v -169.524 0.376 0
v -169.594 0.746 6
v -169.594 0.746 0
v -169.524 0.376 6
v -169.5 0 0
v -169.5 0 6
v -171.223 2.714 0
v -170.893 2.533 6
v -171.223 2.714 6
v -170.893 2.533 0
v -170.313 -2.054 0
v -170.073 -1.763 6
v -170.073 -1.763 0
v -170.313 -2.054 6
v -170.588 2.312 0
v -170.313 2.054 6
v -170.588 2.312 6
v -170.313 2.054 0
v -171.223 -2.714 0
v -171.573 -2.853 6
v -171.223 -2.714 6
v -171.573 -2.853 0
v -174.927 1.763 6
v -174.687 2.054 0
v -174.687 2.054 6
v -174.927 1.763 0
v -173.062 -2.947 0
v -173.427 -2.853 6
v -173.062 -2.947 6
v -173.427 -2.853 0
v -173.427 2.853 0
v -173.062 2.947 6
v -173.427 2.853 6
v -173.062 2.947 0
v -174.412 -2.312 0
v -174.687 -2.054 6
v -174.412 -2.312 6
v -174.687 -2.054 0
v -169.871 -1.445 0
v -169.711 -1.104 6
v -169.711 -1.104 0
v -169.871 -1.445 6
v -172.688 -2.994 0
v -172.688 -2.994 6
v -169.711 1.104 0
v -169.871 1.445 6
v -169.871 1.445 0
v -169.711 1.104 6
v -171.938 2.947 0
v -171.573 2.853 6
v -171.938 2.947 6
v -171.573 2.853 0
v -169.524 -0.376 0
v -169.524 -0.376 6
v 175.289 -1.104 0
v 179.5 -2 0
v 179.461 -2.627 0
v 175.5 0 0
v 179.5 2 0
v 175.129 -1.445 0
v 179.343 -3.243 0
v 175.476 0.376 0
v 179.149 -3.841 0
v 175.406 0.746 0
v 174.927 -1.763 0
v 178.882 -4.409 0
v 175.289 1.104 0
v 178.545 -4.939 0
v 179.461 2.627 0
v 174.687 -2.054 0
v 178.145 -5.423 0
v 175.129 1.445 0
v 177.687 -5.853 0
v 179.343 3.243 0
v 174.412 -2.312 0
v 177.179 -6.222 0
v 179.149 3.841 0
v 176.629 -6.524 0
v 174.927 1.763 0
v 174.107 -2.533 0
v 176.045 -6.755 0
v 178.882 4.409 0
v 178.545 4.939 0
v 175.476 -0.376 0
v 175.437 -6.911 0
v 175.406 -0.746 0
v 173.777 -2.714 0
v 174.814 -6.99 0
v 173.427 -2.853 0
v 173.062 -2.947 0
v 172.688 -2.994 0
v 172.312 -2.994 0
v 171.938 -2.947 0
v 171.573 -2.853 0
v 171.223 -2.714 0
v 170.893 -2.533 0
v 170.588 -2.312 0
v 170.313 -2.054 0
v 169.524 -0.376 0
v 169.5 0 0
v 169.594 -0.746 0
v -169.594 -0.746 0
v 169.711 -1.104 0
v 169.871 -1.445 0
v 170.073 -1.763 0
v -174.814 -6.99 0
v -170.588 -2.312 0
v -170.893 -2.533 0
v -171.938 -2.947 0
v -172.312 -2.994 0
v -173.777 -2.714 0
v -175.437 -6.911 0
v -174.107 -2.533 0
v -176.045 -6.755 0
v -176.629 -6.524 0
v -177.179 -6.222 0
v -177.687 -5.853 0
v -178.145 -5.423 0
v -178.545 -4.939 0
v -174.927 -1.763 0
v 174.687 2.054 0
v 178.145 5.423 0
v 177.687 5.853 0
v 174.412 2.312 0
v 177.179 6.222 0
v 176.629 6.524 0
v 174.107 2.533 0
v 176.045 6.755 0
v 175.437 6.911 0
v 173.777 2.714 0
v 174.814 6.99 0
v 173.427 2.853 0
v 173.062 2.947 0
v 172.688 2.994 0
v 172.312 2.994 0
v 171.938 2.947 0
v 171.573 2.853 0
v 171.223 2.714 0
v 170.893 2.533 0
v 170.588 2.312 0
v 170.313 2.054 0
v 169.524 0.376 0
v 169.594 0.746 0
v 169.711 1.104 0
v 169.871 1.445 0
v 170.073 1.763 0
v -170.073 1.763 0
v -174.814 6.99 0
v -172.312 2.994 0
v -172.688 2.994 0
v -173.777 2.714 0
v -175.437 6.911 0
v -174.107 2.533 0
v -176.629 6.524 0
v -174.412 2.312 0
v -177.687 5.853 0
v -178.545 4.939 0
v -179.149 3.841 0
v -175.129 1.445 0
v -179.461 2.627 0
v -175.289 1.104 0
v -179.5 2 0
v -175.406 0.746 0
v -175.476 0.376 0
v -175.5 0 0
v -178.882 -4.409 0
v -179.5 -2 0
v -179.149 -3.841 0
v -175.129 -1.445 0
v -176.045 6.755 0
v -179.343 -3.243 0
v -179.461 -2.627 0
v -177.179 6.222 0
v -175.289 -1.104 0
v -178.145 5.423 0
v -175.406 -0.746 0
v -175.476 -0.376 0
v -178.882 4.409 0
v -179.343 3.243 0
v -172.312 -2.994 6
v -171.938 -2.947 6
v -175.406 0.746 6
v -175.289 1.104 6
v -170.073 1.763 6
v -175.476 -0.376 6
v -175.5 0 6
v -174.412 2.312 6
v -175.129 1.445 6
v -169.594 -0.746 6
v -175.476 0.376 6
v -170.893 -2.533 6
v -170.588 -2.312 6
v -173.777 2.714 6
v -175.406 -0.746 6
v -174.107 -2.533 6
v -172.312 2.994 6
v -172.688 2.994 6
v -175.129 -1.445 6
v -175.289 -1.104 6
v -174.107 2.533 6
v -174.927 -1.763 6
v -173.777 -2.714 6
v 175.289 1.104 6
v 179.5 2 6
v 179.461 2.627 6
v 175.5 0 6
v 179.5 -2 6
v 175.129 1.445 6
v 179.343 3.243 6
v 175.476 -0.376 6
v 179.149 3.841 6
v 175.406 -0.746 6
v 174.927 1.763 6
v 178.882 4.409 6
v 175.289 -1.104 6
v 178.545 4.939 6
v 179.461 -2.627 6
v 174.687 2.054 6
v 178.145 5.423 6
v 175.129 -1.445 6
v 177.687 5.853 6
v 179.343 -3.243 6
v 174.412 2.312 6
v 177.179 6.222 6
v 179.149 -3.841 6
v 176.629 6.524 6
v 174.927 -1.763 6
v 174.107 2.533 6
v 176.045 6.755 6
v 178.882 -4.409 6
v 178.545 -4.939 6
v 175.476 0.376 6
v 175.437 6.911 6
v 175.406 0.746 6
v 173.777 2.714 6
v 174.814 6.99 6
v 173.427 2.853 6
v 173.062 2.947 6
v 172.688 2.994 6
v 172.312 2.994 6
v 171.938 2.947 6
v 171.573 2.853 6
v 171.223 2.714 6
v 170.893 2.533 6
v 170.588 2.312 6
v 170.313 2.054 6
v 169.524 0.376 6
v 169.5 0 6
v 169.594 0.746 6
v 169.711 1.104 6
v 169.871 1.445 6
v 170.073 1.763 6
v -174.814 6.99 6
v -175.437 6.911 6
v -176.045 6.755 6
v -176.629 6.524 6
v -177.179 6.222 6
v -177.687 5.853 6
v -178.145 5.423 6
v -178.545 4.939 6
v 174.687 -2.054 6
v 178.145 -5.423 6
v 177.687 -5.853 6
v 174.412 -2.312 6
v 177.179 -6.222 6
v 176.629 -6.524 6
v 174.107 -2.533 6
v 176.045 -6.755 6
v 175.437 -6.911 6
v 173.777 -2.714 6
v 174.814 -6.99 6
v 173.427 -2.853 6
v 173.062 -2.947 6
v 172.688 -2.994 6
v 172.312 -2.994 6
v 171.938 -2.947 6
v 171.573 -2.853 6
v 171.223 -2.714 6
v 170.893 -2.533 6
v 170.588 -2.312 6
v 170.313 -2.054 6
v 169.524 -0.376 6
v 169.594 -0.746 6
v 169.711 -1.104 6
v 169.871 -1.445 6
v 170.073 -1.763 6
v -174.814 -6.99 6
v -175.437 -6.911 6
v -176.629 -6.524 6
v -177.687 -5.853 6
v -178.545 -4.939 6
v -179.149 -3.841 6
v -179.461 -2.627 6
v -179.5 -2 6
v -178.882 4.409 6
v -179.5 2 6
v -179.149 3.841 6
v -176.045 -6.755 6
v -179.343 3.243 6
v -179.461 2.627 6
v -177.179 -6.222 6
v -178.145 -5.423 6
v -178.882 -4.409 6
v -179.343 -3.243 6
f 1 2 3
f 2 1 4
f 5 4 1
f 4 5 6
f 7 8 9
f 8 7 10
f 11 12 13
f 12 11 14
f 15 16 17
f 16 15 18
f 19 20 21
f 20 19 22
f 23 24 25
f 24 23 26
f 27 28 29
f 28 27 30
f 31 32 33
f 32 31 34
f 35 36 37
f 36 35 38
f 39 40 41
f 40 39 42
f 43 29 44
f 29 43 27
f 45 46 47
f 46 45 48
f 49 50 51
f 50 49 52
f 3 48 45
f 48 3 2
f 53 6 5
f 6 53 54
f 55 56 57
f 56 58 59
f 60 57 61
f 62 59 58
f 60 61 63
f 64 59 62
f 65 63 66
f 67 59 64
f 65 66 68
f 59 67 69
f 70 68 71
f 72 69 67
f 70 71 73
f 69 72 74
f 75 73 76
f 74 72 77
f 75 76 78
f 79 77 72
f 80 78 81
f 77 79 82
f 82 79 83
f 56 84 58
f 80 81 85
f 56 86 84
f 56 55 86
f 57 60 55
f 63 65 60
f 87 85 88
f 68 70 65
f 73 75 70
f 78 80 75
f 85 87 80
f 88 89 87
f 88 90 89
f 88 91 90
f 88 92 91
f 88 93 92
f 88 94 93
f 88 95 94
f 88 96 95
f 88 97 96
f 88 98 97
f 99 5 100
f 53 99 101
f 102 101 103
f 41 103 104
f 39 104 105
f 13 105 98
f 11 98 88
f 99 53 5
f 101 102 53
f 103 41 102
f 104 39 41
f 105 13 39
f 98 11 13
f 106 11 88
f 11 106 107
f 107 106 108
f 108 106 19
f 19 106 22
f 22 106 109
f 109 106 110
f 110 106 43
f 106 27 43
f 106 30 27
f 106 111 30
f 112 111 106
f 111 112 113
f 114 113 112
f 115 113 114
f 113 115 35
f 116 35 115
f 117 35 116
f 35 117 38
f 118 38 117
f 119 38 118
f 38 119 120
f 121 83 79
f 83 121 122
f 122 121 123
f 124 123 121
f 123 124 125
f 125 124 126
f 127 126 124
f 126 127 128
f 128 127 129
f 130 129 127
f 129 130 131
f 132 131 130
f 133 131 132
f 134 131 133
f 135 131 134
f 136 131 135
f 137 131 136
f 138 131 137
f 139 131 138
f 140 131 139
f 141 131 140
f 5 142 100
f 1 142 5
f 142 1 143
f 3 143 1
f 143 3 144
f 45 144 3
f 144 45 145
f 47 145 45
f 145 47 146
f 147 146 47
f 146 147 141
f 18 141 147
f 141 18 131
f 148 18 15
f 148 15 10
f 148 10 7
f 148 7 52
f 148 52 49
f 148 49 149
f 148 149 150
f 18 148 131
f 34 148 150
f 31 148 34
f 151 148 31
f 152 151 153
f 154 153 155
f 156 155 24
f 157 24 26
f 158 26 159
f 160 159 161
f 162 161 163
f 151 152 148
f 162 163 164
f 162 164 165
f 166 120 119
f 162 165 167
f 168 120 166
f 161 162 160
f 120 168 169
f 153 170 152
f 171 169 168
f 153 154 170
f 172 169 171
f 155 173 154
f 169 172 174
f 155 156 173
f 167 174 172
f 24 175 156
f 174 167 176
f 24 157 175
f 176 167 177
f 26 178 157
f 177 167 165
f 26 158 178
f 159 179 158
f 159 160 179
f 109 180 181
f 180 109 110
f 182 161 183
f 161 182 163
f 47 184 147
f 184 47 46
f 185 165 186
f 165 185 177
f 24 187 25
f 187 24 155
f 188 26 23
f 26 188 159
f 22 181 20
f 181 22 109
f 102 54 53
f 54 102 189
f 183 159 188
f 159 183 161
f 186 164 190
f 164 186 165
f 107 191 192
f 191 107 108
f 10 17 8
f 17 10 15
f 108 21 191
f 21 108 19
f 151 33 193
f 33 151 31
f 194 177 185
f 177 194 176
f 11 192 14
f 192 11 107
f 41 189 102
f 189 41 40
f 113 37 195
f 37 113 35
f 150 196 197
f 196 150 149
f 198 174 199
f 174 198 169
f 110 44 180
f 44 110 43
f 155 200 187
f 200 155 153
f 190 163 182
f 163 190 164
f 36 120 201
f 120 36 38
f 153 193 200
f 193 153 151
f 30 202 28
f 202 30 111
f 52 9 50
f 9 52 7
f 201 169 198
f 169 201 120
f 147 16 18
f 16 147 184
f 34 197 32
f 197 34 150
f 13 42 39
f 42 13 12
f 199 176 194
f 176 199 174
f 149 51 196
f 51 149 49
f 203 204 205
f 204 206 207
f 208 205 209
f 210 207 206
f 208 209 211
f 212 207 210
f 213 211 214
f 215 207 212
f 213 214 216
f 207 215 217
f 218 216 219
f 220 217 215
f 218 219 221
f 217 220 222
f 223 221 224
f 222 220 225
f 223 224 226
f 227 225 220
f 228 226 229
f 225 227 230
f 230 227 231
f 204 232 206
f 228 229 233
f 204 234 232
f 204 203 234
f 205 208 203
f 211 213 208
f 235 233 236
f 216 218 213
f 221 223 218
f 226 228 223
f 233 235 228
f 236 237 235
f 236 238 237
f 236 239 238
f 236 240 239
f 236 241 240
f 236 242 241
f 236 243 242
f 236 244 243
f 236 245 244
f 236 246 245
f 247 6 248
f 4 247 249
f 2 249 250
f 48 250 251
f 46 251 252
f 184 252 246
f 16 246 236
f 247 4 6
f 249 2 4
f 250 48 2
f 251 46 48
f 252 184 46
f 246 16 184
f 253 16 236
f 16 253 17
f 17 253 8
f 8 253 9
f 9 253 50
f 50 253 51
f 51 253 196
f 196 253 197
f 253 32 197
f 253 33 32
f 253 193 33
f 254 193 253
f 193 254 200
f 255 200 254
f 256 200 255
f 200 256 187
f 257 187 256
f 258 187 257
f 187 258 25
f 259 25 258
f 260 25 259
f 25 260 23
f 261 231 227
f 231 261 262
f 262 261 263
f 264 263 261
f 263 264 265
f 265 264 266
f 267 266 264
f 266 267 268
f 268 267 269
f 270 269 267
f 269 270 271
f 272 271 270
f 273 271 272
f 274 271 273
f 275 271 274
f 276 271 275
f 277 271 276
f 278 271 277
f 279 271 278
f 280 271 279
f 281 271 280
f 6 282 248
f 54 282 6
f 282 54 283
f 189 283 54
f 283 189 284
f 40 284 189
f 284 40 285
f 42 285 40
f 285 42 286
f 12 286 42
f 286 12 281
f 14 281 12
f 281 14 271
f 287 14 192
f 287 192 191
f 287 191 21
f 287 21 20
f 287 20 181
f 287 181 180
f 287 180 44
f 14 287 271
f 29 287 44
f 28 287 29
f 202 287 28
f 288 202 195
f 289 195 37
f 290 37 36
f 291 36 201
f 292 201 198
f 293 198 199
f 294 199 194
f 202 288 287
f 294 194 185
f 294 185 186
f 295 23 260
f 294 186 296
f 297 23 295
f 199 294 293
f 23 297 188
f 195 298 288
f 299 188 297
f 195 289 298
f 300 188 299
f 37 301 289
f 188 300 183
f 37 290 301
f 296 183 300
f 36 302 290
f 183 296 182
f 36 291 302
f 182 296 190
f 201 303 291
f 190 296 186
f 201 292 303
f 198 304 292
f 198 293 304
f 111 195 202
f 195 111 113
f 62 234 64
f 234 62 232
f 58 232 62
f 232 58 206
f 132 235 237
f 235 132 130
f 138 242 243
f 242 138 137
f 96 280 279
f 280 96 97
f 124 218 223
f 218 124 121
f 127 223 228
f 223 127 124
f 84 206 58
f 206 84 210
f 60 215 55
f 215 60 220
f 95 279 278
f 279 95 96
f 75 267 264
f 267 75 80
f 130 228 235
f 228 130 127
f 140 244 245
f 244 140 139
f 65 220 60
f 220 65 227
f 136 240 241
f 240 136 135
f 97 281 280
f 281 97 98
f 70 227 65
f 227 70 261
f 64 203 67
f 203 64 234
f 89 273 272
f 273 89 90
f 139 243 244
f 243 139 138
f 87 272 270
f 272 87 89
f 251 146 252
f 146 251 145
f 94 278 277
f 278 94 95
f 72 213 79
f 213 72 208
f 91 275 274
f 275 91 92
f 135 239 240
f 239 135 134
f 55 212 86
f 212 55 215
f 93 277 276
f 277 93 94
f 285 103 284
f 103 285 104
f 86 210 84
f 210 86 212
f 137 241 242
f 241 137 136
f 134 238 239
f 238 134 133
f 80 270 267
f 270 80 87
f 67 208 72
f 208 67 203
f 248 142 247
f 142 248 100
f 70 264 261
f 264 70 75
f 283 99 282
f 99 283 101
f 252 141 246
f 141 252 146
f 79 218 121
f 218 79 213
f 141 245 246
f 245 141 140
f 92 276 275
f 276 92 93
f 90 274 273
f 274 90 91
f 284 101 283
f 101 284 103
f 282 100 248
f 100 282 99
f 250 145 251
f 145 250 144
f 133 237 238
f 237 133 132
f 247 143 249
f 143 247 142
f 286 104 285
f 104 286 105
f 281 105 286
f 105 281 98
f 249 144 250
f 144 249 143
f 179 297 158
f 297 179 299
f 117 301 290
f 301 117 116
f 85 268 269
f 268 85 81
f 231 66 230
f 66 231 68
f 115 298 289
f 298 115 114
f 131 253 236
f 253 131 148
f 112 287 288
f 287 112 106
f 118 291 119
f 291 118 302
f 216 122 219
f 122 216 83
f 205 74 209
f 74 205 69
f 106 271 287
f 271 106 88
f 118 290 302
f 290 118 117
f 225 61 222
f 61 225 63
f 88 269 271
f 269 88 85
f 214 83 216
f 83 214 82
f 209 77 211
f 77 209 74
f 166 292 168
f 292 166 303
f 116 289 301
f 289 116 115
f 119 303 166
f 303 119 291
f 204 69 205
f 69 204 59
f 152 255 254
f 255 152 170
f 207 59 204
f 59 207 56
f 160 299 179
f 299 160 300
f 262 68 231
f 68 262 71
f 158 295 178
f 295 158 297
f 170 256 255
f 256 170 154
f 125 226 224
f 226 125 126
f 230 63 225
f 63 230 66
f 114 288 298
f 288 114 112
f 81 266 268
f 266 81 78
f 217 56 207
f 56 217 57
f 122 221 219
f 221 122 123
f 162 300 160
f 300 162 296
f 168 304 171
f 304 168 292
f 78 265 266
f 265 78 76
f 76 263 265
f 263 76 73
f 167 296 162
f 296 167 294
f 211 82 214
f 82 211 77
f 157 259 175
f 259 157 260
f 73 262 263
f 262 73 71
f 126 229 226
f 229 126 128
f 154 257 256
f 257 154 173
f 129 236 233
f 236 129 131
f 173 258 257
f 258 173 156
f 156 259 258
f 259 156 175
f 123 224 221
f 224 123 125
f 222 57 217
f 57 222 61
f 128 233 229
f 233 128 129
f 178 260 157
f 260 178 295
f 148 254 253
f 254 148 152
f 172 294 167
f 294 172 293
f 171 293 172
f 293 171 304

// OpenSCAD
$fn = 50;


difference() {
	union() {
		hull() {
			translate(v = [-174.5000000000, 2.0000000000, 0]) {
				cylinder(h = 6, r = 5);
			}
			translate(v = [174.5000000000, 2.0000000000, 0]) {
				cylinder(h = 6, r = 5);
			}
			translate(v = [-174.5000000000, -2.0000000000, 0]) {
				cylinder(h = 6, r = 5);
			}
			translate(v = [174.5000000000, -2.0000000000, 0]) {
				cylinder(h = 6, r = 5);
			}
		}
	}
	union() {
		translate(v = [-172.5000000000, 0.0000000000, 0]) {
			cylinder(h = 6, r = 3.0000000000);
		}
		translate(v = [172.5000000000, 0.0000000000, 0]) {
			cylinder(h = 6, r = 3.0000000000);
		}
		translate(v = [-172.5000000000, 0.0000000000, 0]) {
			cylinder(h = 6, r = 1.5000000000);
		}
		translate(v = [172.5000000000, 0.0000000000, 0]) {
			cylinder(h = 6, r = 1.5000000000);
		}
		translate(v = [-172.5000000000, 0.0000000000, 0]) {
			cylinder(h = 6, r = 1.5000000000);
		}
		translate(v = [172.5000000000, 0.0000000000, 0]) {
			cylinder(h = 6, r = 1.5000000000);
		}
		translate(v = [-172.5000000000, 0.0000000000, 0]) {
			cylinder(h = 6, r = 1.5000000000);
		}
		translate(v = [172.5000000000, 0.0000000000, 0]) {
			cylinder(h = 6, r = 1.5000000000);
		}
	}
}
